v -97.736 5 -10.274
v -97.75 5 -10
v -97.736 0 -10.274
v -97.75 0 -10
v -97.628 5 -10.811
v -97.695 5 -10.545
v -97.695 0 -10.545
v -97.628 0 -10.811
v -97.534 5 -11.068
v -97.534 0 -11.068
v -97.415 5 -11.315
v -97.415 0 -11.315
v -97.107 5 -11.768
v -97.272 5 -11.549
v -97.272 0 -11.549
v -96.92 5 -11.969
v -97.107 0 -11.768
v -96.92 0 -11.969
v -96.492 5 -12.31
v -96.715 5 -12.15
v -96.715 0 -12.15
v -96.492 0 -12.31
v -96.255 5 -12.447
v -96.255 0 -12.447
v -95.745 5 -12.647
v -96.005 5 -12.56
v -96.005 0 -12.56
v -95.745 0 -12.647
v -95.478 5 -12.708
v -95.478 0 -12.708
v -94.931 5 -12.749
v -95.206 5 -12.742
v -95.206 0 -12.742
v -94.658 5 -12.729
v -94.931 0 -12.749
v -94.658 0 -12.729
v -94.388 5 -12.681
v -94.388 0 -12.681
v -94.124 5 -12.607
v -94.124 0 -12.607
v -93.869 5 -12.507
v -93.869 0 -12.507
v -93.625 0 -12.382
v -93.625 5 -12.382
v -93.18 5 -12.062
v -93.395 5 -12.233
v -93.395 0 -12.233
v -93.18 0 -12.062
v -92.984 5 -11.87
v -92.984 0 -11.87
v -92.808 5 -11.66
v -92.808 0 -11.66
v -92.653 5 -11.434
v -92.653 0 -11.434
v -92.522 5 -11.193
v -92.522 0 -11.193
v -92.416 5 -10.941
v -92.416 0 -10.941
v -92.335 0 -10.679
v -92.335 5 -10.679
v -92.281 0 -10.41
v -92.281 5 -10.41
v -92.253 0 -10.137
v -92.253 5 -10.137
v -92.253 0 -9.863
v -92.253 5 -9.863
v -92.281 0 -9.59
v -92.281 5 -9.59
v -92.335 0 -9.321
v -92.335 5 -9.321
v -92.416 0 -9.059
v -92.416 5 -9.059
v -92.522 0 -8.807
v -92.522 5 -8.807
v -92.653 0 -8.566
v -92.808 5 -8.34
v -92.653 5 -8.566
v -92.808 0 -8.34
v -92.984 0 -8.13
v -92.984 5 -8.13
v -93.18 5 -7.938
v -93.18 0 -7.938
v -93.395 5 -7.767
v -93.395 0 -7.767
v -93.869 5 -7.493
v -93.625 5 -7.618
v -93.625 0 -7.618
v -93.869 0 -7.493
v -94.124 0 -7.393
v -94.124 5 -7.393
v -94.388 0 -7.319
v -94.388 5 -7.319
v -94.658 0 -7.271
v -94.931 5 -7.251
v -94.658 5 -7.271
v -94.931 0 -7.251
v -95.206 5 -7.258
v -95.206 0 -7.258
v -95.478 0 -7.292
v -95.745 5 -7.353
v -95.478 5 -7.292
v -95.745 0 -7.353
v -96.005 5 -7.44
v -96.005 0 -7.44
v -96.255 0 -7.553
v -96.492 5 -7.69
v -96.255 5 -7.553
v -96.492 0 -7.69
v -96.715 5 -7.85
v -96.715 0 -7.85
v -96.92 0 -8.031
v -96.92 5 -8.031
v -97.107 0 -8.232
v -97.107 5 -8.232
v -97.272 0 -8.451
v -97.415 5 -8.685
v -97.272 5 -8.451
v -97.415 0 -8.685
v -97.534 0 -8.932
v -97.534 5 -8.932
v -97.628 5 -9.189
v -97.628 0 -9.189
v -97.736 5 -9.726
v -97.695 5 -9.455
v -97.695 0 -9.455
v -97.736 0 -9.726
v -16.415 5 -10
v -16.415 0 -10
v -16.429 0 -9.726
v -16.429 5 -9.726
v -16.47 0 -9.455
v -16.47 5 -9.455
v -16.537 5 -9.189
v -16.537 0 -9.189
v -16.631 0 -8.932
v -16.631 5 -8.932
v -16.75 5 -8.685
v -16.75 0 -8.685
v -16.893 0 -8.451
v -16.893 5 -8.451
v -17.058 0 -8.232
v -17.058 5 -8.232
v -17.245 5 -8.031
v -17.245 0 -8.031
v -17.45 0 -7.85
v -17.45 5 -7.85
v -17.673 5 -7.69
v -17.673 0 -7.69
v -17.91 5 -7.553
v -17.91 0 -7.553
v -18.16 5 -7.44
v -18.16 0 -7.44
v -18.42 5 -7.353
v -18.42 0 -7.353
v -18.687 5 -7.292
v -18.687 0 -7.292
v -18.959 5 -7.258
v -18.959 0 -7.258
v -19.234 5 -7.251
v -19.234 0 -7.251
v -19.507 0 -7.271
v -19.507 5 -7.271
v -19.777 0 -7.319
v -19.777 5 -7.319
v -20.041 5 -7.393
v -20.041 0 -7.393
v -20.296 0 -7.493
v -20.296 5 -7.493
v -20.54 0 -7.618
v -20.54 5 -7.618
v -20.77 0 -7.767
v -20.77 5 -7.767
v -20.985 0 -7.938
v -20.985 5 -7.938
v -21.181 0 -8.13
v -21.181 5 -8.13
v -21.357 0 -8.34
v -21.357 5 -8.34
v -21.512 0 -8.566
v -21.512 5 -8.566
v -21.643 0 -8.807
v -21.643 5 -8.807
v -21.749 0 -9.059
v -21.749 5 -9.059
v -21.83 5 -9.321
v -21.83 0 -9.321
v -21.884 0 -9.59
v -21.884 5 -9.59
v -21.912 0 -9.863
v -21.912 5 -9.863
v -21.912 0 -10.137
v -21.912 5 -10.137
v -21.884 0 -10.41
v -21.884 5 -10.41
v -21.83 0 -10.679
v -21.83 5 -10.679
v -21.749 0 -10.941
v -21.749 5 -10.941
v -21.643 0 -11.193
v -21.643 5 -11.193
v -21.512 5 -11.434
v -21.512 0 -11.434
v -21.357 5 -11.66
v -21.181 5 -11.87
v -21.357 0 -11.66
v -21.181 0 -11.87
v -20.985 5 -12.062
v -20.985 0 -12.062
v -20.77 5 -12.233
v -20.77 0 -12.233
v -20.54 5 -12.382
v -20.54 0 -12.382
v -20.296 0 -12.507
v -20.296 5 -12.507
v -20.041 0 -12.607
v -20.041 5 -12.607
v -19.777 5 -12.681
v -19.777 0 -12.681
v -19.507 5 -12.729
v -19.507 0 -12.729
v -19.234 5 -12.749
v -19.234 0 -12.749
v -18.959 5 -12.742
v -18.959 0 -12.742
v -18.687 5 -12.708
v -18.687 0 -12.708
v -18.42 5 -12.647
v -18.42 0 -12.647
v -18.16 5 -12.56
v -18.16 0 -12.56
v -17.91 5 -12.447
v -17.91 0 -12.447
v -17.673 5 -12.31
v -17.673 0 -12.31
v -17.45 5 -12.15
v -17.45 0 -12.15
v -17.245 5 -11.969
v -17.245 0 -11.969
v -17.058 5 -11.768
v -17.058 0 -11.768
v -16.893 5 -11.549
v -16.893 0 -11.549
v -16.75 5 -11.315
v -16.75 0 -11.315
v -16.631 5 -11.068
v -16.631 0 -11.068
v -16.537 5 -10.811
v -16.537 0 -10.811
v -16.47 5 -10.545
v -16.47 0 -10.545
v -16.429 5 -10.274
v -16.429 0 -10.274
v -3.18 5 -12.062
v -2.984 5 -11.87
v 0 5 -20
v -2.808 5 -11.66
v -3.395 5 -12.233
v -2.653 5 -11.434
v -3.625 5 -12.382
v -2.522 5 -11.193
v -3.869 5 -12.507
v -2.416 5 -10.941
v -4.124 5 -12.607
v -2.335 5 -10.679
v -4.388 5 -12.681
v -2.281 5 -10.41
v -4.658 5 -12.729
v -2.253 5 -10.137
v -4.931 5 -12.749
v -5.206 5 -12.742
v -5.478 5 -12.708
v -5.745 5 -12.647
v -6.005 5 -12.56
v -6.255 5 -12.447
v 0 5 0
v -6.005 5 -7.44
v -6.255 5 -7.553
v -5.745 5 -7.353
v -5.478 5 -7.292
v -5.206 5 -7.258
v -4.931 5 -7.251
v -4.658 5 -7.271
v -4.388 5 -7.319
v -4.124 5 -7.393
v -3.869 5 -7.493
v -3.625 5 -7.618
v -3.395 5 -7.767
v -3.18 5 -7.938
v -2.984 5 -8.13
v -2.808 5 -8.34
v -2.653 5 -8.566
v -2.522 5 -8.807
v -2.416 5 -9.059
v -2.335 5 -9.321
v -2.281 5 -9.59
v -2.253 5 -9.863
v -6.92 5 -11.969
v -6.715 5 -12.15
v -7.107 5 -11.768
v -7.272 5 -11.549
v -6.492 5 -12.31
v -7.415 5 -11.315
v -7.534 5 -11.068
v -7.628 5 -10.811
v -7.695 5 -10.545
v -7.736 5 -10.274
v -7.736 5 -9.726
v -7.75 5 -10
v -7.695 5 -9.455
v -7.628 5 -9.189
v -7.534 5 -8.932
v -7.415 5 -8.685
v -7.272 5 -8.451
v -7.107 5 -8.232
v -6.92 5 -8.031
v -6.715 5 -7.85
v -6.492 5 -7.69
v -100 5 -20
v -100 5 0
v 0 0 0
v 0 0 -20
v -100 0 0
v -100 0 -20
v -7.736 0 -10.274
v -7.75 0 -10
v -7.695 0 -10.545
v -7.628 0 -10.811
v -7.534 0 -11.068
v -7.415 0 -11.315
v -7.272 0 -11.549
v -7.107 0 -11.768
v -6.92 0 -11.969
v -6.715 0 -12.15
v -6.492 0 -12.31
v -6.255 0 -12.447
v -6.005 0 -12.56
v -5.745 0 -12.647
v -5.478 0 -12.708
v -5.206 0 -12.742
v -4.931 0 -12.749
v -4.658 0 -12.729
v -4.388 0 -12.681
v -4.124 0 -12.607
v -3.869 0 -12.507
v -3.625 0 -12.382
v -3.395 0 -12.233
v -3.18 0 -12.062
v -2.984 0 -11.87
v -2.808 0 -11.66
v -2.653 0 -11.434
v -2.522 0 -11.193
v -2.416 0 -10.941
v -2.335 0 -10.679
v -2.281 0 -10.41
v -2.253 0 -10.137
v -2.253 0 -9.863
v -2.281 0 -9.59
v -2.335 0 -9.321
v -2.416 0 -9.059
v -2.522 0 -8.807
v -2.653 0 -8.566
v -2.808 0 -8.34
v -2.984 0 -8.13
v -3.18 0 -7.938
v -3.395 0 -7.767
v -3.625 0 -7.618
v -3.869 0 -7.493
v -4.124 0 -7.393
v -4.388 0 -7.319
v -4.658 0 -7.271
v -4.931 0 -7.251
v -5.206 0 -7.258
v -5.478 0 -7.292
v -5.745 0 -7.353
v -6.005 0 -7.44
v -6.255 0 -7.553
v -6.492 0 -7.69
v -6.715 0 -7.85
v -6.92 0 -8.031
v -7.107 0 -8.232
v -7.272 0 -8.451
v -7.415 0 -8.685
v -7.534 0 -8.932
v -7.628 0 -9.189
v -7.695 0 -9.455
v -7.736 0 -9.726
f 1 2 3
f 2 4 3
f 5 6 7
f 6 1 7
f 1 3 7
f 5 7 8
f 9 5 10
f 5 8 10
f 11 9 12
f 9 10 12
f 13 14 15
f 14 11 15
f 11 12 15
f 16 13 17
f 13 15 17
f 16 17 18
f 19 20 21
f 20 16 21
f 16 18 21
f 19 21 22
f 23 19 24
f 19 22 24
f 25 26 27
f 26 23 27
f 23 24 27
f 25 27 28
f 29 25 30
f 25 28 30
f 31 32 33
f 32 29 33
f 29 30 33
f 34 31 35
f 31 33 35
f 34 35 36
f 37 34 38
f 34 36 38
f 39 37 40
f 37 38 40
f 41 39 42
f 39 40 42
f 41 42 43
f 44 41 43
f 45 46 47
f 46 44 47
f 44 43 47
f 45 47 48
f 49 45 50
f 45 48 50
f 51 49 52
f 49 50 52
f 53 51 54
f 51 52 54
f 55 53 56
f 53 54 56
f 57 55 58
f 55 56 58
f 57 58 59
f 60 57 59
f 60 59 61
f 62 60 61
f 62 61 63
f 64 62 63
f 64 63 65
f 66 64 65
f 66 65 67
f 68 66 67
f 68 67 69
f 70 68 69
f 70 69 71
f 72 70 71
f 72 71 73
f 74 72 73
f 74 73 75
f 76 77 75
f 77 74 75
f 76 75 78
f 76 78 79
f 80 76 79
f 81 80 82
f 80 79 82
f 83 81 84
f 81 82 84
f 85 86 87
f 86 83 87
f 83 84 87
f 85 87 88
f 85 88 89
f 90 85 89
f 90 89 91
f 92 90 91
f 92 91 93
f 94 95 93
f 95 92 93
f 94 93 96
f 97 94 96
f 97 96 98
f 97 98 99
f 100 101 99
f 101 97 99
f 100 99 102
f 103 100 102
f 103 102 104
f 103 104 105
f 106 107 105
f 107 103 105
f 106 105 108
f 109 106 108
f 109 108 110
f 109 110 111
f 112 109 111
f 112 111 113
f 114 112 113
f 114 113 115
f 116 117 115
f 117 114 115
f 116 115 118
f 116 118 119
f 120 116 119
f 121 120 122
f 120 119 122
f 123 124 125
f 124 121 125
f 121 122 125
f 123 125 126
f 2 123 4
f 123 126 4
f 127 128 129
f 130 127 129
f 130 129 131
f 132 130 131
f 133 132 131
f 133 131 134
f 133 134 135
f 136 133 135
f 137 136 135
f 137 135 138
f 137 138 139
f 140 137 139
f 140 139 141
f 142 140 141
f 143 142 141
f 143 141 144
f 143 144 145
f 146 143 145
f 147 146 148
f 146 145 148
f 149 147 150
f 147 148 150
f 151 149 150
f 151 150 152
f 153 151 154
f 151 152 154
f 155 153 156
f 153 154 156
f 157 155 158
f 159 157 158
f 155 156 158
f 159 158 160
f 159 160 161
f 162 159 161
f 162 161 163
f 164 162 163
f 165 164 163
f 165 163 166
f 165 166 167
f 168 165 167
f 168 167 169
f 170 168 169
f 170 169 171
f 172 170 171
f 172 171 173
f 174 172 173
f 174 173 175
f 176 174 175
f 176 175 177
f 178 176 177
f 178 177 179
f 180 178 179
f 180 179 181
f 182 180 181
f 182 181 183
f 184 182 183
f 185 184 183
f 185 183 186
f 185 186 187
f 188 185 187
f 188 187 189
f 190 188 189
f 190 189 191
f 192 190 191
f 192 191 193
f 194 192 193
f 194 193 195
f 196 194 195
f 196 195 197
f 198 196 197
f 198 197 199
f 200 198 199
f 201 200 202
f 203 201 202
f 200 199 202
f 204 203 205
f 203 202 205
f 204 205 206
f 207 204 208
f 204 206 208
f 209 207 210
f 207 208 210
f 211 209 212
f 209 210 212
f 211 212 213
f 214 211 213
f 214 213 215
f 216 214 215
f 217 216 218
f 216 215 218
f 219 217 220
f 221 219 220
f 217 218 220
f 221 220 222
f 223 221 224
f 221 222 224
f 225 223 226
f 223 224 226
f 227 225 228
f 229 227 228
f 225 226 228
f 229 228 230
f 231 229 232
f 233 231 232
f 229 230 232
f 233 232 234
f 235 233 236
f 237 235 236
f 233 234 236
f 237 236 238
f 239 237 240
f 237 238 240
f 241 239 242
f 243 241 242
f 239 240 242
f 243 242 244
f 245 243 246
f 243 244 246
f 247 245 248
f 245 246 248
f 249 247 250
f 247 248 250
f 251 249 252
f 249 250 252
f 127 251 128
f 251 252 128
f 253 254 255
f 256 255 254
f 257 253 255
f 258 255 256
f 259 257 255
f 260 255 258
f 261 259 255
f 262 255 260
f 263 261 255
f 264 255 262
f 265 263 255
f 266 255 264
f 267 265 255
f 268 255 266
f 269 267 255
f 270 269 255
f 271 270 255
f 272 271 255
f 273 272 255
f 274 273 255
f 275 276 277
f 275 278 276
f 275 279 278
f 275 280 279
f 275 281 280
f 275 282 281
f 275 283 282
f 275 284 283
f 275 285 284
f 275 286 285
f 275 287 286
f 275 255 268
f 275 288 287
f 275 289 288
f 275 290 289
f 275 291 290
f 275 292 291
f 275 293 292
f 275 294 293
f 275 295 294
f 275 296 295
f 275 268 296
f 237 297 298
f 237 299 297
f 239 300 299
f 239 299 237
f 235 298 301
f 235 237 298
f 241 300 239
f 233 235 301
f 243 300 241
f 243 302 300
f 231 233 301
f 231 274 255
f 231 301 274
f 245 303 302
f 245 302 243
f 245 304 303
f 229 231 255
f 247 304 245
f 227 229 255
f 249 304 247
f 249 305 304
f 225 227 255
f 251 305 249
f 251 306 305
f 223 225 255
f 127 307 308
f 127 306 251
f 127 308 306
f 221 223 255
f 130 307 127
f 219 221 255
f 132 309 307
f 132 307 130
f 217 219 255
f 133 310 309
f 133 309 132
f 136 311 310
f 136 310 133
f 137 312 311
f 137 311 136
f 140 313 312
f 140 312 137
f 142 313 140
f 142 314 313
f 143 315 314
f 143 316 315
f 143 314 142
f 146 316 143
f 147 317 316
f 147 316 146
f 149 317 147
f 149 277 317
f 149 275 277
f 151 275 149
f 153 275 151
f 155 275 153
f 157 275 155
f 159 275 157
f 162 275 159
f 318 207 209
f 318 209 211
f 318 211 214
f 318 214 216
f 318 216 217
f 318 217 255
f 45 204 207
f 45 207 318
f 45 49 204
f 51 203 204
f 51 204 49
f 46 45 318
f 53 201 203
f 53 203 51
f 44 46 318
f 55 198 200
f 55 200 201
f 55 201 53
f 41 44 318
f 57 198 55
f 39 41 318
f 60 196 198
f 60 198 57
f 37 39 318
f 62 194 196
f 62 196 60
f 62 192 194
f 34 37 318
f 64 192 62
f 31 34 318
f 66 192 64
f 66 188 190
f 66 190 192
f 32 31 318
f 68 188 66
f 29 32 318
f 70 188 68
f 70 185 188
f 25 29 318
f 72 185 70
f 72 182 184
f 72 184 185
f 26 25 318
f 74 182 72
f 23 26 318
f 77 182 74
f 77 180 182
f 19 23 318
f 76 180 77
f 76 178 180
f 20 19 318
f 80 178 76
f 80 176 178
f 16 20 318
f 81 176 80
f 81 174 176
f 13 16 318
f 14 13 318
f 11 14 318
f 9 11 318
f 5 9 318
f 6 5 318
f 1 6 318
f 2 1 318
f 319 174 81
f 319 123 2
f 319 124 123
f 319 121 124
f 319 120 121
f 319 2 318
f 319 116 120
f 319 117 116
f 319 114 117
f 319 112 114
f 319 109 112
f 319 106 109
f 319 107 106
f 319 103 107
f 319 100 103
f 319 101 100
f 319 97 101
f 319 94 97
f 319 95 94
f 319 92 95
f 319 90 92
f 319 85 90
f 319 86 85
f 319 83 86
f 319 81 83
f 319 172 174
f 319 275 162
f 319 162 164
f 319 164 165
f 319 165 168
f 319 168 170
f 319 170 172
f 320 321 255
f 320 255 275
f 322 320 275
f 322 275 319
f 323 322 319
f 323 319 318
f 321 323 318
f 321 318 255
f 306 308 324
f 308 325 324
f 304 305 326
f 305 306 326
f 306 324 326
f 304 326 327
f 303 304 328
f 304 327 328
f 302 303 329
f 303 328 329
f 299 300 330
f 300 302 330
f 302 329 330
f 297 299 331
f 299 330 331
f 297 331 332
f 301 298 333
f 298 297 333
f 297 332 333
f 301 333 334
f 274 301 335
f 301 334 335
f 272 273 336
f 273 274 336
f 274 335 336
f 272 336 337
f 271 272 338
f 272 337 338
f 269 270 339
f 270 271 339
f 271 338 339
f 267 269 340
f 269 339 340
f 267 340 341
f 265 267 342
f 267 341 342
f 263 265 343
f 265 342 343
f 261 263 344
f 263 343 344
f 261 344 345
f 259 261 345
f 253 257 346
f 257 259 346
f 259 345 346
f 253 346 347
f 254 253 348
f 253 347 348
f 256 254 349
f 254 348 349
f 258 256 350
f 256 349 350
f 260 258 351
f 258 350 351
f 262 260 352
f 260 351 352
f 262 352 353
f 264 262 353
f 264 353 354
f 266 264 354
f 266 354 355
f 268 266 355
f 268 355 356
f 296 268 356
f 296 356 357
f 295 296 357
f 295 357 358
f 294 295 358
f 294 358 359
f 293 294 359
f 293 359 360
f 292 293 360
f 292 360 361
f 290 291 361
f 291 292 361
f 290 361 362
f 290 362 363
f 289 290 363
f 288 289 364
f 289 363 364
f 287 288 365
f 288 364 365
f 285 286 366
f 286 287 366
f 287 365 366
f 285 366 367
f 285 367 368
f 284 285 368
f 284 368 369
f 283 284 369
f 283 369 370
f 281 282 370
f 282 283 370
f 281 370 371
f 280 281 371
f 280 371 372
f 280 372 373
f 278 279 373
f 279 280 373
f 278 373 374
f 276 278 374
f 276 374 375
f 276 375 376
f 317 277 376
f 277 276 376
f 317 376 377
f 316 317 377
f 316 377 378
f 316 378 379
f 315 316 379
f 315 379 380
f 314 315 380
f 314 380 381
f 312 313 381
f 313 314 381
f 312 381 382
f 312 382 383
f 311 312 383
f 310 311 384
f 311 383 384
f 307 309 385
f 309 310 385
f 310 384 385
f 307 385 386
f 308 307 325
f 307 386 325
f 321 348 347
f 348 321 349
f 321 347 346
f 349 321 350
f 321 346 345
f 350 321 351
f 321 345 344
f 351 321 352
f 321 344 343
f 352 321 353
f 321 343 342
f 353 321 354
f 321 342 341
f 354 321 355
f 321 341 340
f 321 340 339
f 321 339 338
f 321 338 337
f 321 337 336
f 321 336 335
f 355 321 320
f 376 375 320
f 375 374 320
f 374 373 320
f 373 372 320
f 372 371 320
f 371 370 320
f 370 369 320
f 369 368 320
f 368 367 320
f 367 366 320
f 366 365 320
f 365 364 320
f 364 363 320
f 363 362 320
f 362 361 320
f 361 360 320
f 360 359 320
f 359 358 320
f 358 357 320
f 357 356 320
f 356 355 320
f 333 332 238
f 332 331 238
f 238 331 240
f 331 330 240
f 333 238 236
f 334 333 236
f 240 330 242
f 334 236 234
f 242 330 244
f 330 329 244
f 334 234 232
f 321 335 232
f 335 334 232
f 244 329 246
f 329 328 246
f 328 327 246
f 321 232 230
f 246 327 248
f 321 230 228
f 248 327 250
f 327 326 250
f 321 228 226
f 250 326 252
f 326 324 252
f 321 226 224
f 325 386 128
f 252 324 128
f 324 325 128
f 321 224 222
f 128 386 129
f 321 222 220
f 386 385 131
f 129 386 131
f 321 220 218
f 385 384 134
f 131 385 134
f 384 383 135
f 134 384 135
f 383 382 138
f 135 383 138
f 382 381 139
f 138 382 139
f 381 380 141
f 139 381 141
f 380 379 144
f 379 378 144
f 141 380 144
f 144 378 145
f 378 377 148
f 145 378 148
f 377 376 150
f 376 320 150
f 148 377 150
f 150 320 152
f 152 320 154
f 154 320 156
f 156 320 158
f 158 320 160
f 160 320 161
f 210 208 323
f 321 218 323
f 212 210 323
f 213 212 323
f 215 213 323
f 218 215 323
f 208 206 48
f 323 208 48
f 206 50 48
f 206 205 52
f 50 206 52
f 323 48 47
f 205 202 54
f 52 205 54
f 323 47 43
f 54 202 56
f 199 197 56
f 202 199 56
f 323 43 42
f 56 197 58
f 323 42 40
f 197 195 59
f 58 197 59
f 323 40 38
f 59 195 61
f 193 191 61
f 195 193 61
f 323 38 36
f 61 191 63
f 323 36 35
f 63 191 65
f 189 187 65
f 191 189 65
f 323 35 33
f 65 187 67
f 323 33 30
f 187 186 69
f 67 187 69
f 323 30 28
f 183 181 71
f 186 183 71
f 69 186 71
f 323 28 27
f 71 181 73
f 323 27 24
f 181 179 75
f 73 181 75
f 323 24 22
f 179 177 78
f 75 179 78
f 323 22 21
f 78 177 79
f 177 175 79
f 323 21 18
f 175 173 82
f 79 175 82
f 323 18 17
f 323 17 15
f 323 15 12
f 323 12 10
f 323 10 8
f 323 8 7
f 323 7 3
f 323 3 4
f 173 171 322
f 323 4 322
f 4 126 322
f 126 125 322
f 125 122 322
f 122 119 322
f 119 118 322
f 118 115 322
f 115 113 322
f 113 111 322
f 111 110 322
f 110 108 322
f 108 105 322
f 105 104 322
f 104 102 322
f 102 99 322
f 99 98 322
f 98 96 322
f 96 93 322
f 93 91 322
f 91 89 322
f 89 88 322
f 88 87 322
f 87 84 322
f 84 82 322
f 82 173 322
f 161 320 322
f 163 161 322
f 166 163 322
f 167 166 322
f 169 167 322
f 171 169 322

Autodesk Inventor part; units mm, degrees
ref_plane "YZ Plane" through (0, 0, 0) normal (1, 0, 0) x (0, 1, 0)
ref_plane "XZ Plane" through (0, 0, 0) normal (0, 1, 0) x (-1, 0, 0)
ref_plane "XY Plane" through (0, 0, 0) normal (0, 0, 1) x (1, 0, 0)
sketch "Sketch1" plane through (0, 0, 0) normal (0, 1, 0) x (-1, 0, 0)
  line L0 (0, 0) -> (100, 0)
  line L1 (100, 0) -> (100, -20)
  line L2 (100, -20) -> (0, -20)
  line L3 (0, -20) -> (0, 0)
  circle A0 centre (95, -10) radius 2.75
  circle A1 centre (5, -10) radius 2.75
  point P0 (0, -10)
  point P1 (100, -10)
  dimension "d0" = 20
  dimension "d1" = 100
  dimension "d2" = 5.5
  dimension "d3" = 5.5
  dimension "d4" = 5
  dimension "d5" = 5
extrude "Extrusion1" add sketch "Sketch1" along normal blind 5
sketch "Sketch2" plane through (0, 0, 0) normal (0, -1, 0) x (1, 0, 0)
  circle A0 centre (-19.165, -10) radius 2.75
  circle A1 centre (-5, -10) radius 2.75 projected
  line L0 (-100, 0) -> (0, 0) projected
  dimension "d8" = 5.5
  dimension "d9" = 14.165
  dimension "d10" = 10
extrude "Extrusion2" cut sketch "Sketch2" against normal blind 10 contours A0
properties part number "RollYAxis" material "Wood (Birch)"
